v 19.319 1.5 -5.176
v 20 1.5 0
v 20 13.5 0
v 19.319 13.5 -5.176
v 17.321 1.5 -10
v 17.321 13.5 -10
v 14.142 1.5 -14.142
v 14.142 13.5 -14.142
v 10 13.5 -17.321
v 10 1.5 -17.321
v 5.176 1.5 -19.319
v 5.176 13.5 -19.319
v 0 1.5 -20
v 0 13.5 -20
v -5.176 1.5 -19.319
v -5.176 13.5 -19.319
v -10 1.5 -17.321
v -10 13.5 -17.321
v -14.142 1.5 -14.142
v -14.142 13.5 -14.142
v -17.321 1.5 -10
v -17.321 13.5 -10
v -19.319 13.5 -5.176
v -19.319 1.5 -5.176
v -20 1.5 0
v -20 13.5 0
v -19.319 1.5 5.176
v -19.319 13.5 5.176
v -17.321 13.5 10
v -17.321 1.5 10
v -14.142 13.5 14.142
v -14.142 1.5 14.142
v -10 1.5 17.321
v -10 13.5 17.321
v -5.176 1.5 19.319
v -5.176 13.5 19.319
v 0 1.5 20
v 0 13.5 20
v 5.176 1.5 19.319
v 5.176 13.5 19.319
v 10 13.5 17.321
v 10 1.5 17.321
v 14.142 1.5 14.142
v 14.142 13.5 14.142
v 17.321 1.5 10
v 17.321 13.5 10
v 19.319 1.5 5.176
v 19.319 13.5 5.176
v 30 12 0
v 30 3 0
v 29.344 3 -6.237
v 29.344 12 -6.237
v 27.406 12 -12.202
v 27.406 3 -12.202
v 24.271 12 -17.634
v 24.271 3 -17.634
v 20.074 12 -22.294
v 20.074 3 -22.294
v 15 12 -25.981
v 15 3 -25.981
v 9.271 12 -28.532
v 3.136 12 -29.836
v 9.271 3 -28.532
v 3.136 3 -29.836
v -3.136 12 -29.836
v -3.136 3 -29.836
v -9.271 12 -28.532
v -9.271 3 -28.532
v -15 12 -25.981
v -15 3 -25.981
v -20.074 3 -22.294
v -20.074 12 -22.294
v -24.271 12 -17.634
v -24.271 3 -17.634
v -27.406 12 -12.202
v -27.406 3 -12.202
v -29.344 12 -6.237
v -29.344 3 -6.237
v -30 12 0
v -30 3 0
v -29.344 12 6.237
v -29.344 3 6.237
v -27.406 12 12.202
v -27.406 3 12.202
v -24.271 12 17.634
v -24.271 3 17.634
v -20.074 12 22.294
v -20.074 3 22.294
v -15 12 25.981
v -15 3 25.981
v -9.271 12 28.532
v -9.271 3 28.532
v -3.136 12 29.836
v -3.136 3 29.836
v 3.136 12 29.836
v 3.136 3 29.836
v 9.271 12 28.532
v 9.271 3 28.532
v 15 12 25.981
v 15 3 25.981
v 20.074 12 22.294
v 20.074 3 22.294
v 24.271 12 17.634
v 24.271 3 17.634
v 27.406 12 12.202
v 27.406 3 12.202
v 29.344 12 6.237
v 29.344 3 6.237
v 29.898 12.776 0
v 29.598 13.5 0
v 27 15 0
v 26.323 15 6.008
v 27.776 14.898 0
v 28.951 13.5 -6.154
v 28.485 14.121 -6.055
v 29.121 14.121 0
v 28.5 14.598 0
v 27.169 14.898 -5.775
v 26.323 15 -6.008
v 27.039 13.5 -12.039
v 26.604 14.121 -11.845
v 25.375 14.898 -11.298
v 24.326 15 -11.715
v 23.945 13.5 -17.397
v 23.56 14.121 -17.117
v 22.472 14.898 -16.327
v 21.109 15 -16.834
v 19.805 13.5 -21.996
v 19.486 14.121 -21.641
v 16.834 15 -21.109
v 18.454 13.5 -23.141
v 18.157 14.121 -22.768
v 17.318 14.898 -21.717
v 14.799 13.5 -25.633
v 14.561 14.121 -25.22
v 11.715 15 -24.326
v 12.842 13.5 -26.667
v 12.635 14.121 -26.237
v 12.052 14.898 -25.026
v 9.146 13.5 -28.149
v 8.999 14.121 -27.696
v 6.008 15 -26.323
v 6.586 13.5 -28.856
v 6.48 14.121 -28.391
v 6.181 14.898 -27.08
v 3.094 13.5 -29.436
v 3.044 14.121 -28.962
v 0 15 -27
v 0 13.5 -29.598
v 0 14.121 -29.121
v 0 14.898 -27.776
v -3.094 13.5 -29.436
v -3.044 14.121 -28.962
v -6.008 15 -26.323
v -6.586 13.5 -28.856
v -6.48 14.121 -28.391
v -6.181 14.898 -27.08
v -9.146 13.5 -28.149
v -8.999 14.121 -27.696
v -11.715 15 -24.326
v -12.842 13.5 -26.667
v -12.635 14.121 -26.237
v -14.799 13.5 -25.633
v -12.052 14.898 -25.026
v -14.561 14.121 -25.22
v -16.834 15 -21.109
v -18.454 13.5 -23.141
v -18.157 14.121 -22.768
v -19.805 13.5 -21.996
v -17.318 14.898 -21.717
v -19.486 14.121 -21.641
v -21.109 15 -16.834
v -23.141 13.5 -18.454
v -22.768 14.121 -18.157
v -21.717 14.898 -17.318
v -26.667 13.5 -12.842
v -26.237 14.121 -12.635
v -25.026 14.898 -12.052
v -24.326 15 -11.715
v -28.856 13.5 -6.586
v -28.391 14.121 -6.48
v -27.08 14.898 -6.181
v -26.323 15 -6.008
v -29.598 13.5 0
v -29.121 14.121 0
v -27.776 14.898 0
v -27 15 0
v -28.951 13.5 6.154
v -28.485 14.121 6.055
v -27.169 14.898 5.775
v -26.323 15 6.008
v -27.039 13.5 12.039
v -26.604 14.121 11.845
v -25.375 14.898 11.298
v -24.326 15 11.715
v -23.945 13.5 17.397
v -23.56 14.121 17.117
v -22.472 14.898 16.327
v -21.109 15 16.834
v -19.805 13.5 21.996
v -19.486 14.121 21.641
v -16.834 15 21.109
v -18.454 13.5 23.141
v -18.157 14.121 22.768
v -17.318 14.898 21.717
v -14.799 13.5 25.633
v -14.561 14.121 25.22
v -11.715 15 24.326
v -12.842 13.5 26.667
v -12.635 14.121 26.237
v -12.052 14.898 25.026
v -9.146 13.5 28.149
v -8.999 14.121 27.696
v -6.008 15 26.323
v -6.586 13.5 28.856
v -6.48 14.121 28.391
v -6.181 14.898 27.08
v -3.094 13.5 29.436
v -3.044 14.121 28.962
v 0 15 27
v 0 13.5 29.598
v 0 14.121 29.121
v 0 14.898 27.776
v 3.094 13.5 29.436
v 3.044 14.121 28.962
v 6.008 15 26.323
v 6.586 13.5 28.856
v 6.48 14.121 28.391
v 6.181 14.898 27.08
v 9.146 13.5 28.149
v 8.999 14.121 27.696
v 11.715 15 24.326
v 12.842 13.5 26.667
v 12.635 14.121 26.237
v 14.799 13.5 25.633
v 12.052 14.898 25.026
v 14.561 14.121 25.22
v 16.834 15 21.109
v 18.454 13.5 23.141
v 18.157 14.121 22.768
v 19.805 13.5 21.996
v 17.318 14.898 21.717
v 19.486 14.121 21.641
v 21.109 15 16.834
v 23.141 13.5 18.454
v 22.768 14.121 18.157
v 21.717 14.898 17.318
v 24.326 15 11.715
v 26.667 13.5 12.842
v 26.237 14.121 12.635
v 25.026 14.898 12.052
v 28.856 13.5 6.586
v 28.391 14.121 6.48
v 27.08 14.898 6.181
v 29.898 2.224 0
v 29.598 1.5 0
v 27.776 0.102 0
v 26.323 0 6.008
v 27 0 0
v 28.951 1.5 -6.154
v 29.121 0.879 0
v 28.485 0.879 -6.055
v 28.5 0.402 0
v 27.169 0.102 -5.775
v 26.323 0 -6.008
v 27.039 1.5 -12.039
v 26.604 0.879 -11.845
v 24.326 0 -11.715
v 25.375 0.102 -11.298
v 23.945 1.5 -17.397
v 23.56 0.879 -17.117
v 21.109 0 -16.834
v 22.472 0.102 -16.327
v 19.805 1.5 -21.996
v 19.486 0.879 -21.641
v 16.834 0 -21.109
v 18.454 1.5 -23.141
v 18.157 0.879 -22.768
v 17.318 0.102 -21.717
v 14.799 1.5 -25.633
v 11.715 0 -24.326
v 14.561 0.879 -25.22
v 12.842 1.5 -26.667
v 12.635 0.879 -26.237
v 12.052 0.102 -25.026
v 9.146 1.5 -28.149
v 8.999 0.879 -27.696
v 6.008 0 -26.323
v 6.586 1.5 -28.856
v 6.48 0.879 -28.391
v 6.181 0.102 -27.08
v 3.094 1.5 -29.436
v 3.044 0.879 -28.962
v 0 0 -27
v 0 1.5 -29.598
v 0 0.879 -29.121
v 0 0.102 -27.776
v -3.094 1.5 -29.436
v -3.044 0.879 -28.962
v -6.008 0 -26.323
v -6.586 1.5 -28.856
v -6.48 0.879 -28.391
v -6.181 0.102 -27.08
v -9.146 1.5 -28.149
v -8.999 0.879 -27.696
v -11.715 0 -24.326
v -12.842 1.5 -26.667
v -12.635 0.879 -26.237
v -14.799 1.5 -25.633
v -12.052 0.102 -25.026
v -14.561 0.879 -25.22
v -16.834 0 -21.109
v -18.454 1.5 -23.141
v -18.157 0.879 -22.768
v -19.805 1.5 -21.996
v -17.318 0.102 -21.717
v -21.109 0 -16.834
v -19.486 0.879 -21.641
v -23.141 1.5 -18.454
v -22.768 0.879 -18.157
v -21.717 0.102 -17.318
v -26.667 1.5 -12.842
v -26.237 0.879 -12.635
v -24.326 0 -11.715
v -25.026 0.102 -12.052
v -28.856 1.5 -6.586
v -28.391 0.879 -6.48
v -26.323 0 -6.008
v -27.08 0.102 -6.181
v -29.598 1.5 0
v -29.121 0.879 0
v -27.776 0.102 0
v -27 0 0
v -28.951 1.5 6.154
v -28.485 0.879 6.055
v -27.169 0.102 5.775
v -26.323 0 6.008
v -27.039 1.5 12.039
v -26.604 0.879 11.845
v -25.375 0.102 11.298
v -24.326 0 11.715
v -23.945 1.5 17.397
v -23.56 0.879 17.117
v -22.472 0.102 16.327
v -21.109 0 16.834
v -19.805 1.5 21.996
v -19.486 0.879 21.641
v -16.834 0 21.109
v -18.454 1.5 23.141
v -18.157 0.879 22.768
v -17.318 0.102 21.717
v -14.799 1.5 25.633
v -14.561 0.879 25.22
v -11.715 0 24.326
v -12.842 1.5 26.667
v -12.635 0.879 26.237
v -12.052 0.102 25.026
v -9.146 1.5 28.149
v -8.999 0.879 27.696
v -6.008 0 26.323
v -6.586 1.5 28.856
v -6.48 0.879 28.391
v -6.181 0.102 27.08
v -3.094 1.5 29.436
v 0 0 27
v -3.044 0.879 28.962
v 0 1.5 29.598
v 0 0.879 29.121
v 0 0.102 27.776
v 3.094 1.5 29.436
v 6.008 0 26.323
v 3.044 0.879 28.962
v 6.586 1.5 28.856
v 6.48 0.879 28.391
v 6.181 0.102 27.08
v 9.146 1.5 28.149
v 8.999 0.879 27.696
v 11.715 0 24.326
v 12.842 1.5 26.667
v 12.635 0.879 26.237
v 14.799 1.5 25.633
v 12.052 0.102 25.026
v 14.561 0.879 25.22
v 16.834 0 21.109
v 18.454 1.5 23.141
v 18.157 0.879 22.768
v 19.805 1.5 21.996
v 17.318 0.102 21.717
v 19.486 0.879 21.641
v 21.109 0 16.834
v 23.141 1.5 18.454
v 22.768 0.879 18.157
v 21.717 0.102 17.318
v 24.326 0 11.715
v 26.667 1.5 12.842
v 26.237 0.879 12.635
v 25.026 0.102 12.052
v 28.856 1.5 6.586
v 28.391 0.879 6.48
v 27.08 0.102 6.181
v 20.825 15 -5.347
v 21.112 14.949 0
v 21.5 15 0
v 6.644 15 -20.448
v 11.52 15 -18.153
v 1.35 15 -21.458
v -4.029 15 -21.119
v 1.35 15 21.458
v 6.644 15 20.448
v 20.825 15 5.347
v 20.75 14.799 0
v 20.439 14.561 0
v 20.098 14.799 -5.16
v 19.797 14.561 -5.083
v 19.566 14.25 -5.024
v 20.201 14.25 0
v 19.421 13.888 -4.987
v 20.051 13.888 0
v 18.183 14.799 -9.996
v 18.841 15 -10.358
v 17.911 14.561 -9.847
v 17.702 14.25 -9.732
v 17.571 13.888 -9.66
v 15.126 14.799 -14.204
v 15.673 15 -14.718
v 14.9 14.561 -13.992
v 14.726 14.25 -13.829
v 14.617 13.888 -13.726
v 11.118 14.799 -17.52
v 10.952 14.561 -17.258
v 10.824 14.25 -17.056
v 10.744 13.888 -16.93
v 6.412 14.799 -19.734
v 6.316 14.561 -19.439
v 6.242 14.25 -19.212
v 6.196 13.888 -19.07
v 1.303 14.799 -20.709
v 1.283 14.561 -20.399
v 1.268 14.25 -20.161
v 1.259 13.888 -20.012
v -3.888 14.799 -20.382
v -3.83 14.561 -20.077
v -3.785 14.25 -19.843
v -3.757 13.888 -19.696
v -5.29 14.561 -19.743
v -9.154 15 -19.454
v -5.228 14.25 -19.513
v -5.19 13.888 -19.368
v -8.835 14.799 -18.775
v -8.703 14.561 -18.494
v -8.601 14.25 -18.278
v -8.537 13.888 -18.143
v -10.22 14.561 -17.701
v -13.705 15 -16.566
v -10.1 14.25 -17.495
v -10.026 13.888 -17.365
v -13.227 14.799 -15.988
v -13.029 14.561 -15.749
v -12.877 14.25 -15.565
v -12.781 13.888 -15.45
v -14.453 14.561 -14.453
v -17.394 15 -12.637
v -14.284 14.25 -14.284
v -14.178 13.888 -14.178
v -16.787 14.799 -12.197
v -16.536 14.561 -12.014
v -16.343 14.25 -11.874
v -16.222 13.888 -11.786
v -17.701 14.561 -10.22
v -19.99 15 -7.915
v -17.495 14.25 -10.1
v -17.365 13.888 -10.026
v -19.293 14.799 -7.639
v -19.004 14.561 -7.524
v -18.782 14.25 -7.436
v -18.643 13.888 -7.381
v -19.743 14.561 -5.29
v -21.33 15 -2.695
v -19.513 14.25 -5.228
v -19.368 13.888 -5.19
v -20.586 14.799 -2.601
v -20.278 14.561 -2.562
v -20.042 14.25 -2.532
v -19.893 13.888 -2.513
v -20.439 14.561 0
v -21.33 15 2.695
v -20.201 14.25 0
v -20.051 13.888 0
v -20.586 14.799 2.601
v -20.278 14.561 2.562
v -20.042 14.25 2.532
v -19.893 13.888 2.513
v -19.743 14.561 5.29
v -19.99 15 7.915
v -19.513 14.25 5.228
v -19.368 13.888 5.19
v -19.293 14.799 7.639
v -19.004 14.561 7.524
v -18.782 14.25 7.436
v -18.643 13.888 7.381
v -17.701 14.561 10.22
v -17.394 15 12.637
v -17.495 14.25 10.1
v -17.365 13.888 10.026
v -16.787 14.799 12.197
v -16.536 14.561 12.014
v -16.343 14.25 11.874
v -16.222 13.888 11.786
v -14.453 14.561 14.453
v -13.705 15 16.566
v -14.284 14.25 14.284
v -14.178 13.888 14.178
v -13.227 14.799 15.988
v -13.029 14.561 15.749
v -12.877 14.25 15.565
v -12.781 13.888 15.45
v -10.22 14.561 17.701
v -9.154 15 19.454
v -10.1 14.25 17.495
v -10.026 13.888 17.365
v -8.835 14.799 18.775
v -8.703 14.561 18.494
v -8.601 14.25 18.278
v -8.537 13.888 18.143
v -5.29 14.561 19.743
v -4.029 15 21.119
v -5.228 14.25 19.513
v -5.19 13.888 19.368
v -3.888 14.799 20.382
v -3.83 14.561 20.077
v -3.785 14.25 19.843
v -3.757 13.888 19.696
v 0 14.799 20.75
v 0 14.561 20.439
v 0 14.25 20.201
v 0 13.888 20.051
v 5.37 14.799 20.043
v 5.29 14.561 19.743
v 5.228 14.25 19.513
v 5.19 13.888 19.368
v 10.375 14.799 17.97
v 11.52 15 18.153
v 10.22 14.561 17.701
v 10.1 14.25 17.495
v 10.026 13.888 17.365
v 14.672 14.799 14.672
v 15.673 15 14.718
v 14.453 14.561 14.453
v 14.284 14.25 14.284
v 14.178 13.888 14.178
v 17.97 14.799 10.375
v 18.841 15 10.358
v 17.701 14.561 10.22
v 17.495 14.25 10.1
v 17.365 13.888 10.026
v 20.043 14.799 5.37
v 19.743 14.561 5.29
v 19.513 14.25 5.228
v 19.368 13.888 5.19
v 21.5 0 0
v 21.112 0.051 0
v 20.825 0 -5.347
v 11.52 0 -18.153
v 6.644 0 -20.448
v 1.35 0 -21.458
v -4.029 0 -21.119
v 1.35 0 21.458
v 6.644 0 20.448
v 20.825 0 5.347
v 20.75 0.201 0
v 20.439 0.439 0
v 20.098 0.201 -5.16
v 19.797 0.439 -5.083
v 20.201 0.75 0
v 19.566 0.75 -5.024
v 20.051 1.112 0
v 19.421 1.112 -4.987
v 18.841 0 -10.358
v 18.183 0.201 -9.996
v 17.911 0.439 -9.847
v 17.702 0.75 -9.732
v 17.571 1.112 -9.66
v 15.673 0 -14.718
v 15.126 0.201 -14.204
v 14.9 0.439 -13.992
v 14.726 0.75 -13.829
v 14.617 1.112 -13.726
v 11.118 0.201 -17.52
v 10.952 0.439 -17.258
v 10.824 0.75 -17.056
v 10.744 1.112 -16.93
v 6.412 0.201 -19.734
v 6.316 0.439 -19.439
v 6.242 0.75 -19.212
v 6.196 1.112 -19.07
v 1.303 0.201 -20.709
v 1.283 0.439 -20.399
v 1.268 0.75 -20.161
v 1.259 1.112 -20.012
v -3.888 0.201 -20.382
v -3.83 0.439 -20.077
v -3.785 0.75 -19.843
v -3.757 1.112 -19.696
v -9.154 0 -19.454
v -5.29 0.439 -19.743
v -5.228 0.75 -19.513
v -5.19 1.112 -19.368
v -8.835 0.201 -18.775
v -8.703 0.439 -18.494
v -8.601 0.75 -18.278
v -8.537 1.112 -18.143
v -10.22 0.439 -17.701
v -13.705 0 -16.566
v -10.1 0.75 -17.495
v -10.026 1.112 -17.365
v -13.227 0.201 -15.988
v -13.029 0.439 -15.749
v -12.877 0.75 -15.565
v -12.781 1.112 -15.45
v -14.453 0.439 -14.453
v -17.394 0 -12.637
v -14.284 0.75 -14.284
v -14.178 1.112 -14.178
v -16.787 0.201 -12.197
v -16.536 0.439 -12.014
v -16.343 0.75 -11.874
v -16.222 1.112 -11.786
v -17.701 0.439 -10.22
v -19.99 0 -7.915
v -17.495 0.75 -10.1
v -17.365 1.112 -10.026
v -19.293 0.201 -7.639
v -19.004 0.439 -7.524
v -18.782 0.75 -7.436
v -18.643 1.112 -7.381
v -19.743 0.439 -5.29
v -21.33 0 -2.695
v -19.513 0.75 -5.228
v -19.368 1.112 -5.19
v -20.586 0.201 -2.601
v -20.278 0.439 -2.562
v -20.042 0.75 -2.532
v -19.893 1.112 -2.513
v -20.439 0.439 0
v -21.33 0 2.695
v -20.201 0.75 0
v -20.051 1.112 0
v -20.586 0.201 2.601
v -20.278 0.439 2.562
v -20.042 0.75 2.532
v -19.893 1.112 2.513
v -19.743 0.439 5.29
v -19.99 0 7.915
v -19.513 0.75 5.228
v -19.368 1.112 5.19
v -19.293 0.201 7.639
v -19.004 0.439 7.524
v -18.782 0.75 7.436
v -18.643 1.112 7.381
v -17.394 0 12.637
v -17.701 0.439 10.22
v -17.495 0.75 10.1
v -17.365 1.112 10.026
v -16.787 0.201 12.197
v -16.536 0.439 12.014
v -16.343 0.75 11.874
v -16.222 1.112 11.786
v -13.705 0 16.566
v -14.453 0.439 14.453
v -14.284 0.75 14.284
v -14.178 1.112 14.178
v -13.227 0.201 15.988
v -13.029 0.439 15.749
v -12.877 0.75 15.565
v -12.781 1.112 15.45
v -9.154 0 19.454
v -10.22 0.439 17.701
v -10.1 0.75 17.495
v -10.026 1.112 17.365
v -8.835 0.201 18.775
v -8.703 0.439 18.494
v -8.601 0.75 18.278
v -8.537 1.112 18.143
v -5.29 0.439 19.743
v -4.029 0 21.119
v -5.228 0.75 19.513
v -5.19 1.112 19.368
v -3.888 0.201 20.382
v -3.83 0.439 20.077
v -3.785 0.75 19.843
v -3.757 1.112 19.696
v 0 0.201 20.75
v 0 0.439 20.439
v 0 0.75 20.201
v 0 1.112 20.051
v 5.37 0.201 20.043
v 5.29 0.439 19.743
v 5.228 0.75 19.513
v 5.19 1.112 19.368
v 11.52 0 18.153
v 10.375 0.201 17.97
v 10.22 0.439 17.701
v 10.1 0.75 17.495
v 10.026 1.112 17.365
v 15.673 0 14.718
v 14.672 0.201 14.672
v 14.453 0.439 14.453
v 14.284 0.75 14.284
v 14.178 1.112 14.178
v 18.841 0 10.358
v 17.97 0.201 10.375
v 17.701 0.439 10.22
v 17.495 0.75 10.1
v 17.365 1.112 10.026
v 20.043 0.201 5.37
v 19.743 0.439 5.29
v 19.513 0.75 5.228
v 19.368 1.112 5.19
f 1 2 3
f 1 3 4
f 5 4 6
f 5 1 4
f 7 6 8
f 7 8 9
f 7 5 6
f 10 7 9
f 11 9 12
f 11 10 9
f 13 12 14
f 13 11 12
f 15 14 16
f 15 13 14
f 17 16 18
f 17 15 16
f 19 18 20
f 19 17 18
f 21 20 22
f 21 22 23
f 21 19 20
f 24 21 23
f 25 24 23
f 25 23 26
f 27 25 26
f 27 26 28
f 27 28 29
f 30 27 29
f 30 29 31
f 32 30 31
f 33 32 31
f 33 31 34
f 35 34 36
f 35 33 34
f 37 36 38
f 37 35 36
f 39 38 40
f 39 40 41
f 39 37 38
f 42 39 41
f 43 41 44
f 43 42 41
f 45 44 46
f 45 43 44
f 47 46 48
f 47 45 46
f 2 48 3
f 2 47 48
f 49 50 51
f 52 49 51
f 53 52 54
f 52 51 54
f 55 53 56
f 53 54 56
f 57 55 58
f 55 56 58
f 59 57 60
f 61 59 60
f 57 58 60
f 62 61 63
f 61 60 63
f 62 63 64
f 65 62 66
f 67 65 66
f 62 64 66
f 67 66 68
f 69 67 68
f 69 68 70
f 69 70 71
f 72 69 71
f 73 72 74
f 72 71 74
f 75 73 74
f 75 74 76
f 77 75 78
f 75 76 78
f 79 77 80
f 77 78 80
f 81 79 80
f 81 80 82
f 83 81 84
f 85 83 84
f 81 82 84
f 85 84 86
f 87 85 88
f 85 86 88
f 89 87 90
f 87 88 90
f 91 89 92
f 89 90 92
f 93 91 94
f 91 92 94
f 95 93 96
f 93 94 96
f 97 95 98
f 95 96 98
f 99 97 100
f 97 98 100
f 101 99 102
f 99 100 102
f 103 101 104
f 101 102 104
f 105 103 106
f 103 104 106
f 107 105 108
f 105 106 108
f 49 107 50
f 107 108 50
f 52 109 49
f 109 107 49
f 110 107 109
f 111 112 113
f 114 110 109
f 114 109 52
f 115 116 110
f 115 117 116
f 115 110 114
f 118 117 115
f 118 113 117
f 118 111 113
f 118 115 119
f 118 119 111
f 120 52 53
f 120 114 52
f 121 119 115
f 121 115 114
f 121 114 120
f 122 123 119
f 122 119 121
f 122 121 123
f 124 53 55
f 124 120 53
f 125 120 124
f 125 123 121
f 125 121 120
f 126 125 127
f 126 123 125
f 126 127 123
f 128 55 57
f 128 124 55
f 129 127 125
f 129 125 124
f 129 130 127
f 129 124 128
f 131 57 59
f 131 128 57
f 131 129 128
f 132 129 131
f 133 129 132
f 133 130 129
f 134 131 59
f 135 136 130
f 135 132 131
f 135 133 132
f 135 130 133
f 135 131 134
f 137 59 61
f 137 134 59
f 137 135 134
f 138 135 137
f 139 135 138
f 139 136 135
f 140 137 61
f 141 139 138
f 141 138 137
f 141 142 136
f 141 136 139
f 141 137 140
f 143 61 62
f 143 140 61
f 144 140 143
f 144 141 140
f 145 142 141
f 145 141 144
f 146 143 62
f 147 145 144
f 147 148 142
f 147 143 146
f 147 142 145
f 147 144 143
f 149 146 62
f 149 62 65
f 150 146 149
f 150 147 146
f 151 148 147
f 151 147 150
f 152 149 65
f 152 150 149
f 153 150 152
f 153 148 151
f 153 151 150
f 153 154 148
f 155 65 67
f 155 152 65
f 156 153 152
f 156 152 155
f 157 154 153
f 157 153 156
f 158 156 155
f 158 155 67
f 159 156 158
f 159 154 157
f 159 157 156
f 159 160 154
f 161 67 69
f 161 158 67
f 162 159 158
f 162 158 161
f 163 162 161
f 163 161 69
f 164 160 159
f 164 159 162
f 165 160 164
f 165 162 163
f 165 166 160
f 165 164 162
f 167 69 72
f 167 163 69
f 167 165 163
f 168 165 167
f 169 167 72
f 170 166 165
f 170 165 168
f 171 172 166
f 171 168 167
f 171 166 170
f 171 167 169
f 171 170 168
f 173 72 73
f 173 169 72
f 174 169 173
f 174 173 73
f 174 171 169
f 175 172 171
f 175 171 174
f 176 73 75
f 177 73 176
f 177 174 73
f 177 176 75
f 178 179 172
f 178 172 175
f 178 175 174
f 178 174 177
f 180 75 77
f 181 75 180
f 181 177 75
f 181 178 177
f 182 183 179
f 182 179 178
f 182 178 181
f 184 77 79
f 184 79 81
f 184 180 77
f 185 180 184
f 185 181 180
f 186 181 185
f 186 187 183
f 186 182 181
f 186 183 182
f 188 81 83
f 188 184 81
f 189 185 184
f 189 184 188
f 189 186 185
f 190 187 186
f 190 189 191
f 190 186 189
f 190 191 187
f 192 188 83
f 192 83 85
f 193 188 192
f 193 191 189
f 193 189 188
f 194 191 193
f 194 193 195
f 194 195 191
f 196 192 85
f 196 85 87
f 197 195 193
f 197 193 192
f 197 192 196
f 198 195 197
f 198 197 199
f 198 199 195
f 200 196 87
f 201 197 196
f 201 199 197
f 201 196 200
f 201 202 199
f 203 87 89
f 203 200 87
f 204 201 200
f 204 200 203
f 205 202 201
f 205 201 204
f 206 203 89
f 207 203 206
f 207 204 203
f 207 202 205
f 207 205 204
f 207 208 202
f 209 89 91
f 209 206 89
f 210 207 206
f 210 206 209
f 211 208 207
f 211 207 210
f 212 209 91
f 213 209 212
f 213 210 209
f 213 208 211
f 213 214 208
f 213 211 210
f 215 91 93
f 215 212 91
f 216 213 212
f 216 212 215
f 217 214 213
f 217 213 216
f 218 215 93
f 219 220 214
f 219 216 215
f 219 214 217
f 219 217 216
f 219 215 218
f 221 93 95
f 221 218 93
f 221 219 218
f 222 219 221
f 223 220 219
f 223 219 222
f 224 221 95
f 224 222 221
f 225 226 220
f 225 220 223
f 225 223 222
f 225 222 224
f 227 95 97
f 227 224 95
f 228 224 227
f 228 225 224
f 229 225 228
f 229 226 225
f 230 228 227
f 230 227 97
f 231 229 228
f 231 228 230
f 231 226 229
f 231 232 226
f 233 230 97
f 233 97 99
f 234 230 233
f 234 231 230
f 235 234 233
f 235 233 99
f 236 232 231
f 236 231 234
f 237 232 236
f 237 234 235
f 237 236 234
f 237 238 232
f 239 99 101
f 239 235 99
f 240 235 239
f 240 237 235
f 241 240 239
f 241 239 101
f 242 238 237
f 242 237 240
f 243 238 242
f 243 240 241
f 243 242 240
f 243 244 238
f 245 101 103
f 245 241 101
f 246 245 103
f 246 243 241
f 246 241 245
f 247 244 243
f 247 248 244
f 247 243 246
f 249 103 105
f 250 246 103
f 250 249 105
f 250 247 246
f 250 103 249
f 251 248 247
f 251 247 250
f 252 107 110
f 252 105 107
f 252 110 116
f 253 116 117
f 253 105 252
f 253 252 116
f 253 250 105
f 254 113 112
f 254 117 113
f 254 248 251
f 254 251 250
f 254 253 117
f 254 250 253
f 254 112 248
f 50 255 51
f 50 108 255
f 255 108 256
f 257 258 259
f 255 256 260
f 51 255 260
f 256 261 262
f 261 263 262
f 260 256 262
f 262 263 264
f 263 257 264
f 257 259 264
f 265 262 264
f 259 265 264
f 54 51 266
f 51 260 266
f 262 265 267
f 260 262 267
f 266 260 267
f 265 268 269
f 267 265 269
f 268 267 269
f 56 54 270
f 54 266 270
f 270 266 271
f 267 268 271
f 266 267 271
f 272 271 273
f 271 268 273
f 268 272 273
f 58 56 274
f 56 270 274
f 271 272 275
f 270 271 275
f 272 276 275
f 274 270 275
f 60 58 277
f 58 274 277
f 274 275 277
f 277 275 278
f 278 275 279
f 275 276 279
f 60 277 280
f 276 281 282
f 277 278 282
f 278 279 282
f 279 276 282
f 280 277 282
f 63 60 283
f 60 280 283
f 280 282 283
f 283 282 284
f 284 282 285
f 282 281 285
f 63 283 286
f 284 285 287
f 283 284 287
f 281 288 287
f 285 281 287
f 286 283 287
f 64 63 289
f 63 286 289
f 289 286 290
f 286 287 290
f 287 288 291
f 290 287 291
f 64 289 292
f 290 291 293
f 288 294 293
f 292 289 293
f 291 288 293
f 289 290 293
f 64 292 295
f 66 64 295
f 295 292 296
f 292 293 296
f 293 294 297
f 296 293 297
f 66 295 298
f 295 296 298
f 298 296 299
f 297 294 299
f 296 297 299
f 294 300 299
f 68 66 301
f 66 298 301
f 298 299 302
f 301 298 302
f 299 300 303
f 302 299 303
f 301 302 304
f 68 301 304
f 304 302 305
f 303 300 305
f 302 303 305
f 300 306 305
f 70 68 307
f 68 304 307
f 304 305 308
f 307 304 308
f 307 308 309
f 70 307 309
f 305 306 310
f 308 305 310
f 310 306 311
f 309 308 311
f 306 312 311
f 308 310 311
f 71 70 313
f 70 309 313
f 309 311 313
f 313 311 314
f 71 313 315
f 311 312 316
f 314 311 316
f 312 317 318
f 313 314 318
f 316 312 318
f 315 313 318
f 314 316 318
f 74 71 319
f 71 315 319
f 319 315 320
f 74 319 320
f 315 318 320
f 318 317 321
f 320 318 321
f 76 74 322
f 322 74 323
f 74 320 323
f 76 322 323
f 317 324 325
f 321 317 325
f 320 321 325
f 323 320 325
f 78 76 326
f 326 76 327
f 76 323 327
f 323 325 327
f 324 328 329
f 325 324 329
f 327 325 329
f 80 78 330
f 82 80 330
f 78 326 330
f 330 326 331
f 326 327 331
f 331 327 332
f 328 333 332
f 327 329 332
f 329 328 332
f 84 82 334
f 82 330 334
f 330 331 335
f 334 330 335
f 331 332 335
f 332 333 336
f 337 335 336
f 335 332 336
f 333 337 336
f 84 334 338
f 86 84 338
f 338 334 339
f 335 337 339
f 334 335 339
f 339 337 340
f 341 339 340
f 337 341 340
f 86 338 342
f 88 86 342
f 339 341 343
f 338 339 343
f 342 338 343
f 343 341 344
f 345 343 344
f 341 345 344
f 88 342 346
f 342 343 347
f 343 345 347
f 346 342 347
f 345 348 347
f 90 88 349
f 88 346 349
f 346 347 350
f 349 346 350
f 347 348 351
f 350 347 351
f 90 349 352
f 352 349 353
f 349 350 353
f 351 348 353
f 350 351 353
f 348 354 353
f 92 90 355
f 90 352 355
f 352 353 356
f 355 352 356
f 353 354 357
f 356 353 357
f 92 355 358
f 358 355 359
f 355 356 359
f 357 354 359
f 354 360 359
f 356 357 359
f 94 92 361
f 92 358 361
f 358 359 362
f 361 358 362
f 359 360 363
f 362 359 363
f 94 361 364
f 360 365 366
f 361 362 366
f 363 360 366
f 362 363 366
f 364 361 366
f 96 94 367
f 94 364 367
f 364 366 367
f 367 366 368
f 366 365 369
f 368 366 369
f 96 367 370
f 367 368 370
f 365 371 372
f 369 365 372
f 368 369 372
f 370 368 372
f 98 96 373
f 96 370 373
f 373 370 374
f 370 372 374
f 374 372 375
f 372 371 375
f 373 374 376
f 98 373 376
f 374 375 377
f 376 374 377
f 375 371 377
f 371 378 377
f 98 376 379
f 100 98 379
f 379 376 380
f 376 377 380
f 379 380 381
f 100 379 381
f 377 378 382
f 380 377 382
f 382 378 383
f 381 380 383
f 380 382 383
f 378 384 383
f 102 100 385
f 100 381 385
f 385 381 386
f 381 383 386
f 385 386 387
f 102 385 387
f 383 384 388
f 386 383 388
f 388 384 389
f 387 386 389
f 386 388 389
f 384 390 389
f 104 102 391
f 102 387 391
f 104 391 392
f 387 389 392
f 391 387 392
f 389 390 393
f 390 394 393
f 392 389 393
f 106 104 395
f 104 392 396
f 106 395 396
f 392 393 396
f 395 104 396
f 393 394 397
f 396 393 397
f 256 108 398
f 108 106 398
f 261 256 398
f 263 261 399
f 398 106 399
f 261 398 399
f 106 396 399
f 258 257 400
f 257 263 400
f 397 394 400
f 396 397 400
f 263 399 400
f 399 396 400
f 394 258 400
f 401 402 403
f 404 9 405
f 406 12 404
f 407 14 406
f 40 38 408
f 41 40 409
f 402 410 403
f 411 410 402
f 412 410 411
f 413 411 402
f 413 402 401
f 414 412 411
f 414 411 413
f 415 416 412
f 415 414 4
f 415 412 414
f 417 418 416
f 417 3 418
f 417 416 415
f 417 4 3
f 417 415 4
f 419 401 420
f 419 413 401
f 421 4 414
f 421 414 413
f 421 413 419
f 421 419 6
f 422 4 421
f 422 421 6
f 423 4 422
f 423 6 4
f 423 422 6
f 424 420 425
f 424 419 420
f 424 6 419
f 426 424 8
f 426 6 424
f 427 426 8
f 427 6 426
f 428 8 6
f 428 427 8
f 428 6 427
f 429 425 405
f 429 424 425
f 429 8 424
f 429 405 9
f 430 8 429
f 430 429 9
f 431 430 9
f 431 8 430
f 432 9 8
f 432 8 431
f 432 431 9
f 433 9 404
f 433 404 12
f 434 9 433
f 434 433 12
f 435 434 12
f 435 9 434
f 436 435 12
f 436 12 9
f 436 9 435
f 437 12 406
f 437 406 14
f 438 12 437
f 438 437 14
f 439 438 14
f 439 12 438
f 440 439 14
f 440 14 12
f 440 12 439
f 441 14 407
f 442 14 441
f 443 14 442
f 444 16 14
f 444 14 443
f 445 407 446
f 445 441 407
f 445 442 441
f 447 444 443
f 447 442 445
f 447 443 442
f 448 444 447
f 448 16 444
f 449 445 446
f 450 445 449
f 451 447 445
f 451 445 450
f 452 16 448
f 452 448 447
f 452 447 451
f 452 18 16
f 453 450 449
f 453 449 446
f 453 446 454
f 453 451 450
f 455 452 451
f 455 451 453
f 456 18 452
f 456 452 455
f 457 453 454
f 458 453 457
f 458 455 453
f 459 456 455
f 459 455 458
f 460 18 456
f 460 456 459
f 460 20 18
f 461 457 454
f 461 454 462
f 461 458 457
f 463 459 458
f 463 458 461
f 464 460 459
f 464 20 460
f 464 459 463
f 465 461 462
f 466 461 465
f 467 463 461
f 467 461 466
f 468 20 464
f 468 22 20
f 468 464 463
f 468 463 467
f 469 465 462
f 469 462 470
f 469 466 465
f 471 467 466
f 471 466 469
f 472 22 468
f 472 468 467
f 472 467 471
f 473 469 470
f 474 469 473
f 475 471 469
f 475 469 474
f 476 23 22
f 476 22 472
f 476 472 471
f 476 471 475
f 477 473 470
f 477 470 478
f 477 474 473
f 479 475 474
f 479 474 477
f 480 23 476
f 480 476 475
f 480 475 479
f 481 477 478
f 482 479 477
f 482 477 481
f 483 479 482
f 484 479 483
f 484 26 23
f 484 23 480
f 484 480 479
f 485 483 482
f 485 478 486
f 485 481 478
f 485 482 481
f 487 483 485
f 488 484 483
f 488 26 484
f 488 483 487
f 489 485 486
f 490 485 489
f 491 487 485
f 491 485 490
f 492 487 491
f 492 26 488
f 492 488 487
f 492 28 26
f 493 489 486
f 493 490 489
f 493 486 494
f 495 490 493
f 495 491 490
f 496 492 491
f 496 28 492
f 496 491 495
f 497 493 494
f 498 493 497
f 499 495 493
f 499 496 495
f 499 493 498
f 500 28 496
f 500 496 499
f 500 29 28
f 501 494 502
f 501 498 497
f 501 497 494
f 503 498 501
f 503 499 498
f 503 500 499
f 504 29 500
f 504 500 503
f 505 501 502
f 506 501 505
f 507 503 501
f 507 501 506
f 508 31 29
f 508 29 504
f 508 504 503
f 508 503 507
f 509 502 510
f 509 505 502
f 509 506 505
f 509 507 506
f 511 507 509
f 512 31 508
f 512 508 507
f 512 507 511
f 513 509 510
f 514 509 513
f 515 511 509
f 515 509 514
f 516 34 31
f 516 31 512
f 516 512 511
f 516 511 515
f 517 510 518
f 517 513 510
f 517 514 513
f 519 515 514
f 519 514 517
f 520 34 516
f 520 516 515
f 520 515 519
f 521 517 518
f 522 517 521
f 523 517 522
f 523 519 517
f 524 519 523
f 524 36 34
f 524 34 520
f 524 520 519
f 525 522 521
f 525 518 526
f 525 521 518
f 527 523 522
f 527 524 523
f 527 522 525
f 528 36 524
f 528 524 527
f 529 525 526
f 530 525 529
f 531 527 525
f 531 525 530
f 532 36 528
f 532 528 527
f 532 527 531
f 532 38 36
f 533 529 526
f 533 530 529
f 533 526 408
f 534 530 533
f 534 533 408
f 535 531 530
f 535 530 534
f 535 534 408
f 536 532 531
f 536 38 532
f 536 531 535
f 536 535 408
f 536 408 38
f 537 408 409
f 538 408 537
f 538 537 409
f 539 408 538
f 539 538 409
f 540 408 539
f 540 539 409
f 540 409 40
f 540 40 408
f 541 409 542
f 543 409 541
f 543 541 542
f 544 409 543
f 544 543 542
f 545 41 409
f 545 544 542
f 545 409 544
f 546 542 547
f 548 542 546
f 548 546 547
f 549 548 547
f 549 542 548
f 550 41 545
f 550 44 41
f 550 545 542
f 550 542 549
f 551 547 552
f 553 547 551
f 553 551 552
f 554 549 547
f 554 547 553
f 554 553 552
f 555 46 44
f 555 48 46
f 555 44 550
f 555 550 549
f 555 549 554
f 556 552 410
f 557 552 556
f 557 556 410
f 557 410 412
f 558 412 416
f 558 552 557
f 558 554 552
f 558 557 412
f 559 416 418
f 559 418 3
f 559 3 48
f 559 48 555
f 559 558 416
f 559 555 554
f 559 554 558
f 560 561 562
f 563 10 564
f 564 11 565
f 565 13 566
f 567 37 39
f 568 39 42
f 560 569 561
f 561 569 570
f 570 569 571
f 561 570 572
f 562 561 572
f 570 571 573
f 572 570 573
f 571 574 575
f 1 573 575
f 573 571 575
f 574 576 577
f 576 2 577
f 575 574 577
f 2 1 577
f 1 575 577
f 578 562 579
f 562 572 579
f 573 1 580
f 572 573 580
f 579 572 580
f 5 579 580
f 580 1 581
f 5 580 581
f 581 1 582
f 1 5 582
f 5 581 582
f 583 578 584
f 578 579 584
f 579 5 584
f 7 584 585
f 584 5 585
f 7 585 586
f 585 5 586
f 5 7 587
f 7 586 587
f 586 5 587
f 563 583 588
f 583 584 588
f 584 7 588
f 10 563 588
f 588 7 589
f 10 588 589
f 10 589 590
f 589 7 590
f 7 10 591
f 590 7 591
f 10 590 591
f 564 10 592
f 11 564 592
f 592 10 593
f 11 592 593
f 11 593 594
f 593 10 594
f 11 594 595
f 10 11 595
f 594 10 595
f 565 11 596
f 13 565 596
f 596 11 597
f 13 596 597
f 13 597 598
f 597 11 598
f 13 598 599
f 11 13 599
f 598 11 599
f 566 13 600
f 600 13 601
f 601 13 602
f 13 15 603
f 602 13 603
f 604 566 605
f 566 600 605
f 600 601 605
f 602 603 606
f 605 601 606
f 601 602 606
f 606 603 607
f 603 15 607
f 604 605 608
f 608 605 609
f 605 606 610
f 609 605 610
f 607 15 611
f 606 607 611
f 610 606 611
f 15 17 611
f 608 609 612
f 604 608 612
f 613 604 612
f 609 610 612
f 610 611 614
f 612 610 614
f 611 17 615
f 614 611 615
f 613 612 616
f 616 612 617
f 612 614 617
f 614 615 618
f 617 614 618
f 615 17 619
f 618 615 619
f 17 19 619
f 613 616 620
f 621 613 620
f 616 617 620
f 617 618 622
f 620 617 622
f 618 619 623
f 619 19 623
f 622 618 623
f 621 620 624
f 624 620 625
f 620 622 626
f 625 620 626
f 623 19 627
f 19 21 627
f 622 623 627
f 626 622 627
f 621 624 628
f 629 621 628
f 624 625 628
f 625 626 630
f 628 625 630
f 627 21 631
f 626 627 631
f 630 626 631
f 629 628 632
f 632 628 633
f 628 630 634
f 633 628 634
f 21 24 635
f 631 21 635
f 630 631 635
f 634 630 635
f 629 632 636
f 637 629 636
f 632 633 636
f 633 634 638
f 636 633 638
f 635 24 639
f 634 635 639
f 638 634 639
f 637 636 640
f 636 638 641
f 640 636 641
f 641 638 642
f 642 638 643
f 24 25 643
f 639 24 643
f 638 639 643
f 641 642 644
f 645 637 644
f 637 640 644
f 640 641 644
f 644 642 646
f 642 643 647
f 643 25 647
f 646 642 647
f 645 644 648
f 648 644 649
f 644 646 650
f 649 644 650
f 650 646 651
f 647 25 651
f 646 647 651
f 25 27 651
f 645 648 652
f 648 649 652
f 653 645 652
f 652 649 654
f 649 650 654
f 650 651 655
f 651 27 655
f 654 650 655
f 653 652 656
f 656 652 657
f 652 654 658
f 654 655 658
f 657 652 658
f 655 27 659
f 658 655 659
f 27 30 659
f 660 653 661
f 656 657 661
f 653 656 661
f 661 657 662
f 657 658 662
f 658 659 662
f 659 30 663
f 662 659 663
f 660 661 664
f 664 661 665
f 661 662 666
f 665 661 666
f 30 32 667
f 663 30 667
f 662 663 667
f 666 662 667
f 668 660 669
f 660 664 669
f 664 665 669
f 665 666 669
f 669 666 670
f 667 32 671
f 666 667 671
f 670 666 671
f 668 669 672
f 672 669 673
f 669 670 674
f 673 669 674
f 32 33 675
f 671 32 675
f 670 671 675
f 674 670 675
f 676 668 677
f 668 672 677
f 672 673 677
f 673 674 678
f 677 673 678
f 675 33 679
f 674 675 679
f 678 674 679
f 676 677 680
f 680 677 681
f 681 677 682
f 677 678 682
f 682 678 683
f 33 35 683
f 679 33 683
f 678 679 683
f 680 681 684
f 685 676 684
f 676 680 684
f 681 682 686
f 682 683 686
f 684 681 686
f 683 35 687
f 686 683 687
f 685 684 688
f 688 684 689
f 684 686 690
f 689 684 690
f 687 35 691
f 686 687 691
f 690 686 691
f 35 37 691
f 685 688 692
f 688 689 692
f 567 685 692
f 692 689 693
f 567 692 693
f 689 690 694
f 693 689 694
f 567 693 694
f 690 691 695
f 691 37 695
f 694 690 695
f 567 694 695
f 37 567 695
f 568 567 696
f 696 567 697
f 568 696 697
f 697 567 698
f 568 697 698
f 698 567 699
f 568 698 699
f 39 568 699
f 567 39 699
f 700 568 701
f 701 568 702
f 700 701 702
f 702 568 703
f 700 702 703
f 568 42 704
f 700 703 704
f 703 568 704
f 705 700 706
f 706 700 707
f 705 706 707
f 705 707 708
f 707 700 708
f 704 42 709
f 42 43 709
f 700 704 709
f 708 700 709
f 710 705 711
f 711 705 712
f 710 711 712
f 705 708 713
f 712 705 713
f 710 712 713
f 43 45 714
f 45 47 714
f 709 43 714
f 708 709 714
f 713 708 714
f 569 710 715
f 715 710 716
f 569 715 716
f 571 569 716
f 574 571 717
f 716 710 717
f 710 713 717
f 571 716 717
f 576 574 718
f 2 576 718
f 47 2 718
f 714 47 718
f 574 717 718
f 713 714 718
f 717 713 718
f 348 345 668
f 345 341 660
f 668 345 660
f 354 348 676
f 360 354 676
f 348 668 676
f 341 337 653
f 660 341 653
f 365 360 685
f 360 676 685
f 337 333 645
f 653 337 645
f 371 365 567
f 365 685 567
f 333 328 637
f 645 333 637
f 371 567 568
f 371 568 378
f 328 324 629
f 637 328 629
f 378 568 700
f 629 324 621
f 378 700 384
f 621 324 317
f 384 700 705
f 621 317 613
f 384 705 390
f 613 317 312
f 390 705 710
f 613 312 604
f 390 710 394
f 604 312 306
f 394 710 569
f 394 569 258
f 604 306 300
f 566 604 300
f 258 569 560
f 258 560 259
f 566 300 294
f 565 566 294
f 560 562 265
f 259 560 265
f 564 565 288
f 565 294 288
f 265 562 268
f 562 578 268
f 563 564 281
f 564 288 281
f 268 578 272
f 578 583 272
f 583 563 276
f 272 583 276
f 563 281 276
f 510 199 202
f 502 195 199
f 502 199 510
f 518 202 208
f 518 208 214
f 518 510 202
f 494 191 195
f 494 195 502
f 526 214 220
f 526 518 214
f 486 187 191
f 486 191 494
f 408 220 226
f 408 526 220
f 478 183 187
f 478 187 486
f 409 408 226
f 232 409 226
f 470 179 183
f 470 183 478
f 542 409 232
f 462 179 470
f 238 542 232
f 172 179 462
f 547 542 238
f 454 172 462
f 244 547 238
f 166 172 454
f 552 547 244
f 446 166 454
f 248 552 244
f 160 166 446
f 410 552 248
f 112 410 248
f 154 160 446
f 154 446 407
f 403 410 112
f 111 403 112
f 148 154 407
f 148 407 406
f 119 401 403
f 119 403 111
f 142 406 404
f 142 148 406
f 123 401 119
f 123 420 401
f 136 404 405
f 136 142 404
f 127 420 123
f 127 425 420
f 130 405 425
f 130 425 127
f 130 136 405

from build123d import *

# Parameters (mm, degrees)
SKETCH1_R           = 30
SKETCH1_R_2         = 20
BOSS_EXTRUDE1_DEPTH = 15
FILLET1_R           = 3
FILLET2_R           = 1.5


with BuildPart() as part:
    # Sketch1 → Boss-Extrude1 (new body)
    with BuildSketch(Plane(origin=(0, 0, 0), x_dir=(1, 0, 0), z_dir=(0, 1, 0))):
        Circle(SKETCH1_R)
        Circle(SKETCH1_R_2, mode=Mode.SUBTRACT)
    extrude(amount=BOSS_EXTRUDE1_DEPTH)

    # Fillet1
    fillet1_edges = [part.edges().sort_by_distance(p)[0] for p in [
        (-30, 0, 0),
        (-30, 15, 0),
    ]]
    fillet(fillet1_edges, radius=FILLET1_R)

    # Fillet2
    fillet2_edges = [part.edges().sort_by_distance(p)[0] for p in [
        (-20, 0, 0),
        (-20, 15, 0),
    ]]
    fillet(fillet2_edges, radius=FILLET2_R)


solid = part.part
